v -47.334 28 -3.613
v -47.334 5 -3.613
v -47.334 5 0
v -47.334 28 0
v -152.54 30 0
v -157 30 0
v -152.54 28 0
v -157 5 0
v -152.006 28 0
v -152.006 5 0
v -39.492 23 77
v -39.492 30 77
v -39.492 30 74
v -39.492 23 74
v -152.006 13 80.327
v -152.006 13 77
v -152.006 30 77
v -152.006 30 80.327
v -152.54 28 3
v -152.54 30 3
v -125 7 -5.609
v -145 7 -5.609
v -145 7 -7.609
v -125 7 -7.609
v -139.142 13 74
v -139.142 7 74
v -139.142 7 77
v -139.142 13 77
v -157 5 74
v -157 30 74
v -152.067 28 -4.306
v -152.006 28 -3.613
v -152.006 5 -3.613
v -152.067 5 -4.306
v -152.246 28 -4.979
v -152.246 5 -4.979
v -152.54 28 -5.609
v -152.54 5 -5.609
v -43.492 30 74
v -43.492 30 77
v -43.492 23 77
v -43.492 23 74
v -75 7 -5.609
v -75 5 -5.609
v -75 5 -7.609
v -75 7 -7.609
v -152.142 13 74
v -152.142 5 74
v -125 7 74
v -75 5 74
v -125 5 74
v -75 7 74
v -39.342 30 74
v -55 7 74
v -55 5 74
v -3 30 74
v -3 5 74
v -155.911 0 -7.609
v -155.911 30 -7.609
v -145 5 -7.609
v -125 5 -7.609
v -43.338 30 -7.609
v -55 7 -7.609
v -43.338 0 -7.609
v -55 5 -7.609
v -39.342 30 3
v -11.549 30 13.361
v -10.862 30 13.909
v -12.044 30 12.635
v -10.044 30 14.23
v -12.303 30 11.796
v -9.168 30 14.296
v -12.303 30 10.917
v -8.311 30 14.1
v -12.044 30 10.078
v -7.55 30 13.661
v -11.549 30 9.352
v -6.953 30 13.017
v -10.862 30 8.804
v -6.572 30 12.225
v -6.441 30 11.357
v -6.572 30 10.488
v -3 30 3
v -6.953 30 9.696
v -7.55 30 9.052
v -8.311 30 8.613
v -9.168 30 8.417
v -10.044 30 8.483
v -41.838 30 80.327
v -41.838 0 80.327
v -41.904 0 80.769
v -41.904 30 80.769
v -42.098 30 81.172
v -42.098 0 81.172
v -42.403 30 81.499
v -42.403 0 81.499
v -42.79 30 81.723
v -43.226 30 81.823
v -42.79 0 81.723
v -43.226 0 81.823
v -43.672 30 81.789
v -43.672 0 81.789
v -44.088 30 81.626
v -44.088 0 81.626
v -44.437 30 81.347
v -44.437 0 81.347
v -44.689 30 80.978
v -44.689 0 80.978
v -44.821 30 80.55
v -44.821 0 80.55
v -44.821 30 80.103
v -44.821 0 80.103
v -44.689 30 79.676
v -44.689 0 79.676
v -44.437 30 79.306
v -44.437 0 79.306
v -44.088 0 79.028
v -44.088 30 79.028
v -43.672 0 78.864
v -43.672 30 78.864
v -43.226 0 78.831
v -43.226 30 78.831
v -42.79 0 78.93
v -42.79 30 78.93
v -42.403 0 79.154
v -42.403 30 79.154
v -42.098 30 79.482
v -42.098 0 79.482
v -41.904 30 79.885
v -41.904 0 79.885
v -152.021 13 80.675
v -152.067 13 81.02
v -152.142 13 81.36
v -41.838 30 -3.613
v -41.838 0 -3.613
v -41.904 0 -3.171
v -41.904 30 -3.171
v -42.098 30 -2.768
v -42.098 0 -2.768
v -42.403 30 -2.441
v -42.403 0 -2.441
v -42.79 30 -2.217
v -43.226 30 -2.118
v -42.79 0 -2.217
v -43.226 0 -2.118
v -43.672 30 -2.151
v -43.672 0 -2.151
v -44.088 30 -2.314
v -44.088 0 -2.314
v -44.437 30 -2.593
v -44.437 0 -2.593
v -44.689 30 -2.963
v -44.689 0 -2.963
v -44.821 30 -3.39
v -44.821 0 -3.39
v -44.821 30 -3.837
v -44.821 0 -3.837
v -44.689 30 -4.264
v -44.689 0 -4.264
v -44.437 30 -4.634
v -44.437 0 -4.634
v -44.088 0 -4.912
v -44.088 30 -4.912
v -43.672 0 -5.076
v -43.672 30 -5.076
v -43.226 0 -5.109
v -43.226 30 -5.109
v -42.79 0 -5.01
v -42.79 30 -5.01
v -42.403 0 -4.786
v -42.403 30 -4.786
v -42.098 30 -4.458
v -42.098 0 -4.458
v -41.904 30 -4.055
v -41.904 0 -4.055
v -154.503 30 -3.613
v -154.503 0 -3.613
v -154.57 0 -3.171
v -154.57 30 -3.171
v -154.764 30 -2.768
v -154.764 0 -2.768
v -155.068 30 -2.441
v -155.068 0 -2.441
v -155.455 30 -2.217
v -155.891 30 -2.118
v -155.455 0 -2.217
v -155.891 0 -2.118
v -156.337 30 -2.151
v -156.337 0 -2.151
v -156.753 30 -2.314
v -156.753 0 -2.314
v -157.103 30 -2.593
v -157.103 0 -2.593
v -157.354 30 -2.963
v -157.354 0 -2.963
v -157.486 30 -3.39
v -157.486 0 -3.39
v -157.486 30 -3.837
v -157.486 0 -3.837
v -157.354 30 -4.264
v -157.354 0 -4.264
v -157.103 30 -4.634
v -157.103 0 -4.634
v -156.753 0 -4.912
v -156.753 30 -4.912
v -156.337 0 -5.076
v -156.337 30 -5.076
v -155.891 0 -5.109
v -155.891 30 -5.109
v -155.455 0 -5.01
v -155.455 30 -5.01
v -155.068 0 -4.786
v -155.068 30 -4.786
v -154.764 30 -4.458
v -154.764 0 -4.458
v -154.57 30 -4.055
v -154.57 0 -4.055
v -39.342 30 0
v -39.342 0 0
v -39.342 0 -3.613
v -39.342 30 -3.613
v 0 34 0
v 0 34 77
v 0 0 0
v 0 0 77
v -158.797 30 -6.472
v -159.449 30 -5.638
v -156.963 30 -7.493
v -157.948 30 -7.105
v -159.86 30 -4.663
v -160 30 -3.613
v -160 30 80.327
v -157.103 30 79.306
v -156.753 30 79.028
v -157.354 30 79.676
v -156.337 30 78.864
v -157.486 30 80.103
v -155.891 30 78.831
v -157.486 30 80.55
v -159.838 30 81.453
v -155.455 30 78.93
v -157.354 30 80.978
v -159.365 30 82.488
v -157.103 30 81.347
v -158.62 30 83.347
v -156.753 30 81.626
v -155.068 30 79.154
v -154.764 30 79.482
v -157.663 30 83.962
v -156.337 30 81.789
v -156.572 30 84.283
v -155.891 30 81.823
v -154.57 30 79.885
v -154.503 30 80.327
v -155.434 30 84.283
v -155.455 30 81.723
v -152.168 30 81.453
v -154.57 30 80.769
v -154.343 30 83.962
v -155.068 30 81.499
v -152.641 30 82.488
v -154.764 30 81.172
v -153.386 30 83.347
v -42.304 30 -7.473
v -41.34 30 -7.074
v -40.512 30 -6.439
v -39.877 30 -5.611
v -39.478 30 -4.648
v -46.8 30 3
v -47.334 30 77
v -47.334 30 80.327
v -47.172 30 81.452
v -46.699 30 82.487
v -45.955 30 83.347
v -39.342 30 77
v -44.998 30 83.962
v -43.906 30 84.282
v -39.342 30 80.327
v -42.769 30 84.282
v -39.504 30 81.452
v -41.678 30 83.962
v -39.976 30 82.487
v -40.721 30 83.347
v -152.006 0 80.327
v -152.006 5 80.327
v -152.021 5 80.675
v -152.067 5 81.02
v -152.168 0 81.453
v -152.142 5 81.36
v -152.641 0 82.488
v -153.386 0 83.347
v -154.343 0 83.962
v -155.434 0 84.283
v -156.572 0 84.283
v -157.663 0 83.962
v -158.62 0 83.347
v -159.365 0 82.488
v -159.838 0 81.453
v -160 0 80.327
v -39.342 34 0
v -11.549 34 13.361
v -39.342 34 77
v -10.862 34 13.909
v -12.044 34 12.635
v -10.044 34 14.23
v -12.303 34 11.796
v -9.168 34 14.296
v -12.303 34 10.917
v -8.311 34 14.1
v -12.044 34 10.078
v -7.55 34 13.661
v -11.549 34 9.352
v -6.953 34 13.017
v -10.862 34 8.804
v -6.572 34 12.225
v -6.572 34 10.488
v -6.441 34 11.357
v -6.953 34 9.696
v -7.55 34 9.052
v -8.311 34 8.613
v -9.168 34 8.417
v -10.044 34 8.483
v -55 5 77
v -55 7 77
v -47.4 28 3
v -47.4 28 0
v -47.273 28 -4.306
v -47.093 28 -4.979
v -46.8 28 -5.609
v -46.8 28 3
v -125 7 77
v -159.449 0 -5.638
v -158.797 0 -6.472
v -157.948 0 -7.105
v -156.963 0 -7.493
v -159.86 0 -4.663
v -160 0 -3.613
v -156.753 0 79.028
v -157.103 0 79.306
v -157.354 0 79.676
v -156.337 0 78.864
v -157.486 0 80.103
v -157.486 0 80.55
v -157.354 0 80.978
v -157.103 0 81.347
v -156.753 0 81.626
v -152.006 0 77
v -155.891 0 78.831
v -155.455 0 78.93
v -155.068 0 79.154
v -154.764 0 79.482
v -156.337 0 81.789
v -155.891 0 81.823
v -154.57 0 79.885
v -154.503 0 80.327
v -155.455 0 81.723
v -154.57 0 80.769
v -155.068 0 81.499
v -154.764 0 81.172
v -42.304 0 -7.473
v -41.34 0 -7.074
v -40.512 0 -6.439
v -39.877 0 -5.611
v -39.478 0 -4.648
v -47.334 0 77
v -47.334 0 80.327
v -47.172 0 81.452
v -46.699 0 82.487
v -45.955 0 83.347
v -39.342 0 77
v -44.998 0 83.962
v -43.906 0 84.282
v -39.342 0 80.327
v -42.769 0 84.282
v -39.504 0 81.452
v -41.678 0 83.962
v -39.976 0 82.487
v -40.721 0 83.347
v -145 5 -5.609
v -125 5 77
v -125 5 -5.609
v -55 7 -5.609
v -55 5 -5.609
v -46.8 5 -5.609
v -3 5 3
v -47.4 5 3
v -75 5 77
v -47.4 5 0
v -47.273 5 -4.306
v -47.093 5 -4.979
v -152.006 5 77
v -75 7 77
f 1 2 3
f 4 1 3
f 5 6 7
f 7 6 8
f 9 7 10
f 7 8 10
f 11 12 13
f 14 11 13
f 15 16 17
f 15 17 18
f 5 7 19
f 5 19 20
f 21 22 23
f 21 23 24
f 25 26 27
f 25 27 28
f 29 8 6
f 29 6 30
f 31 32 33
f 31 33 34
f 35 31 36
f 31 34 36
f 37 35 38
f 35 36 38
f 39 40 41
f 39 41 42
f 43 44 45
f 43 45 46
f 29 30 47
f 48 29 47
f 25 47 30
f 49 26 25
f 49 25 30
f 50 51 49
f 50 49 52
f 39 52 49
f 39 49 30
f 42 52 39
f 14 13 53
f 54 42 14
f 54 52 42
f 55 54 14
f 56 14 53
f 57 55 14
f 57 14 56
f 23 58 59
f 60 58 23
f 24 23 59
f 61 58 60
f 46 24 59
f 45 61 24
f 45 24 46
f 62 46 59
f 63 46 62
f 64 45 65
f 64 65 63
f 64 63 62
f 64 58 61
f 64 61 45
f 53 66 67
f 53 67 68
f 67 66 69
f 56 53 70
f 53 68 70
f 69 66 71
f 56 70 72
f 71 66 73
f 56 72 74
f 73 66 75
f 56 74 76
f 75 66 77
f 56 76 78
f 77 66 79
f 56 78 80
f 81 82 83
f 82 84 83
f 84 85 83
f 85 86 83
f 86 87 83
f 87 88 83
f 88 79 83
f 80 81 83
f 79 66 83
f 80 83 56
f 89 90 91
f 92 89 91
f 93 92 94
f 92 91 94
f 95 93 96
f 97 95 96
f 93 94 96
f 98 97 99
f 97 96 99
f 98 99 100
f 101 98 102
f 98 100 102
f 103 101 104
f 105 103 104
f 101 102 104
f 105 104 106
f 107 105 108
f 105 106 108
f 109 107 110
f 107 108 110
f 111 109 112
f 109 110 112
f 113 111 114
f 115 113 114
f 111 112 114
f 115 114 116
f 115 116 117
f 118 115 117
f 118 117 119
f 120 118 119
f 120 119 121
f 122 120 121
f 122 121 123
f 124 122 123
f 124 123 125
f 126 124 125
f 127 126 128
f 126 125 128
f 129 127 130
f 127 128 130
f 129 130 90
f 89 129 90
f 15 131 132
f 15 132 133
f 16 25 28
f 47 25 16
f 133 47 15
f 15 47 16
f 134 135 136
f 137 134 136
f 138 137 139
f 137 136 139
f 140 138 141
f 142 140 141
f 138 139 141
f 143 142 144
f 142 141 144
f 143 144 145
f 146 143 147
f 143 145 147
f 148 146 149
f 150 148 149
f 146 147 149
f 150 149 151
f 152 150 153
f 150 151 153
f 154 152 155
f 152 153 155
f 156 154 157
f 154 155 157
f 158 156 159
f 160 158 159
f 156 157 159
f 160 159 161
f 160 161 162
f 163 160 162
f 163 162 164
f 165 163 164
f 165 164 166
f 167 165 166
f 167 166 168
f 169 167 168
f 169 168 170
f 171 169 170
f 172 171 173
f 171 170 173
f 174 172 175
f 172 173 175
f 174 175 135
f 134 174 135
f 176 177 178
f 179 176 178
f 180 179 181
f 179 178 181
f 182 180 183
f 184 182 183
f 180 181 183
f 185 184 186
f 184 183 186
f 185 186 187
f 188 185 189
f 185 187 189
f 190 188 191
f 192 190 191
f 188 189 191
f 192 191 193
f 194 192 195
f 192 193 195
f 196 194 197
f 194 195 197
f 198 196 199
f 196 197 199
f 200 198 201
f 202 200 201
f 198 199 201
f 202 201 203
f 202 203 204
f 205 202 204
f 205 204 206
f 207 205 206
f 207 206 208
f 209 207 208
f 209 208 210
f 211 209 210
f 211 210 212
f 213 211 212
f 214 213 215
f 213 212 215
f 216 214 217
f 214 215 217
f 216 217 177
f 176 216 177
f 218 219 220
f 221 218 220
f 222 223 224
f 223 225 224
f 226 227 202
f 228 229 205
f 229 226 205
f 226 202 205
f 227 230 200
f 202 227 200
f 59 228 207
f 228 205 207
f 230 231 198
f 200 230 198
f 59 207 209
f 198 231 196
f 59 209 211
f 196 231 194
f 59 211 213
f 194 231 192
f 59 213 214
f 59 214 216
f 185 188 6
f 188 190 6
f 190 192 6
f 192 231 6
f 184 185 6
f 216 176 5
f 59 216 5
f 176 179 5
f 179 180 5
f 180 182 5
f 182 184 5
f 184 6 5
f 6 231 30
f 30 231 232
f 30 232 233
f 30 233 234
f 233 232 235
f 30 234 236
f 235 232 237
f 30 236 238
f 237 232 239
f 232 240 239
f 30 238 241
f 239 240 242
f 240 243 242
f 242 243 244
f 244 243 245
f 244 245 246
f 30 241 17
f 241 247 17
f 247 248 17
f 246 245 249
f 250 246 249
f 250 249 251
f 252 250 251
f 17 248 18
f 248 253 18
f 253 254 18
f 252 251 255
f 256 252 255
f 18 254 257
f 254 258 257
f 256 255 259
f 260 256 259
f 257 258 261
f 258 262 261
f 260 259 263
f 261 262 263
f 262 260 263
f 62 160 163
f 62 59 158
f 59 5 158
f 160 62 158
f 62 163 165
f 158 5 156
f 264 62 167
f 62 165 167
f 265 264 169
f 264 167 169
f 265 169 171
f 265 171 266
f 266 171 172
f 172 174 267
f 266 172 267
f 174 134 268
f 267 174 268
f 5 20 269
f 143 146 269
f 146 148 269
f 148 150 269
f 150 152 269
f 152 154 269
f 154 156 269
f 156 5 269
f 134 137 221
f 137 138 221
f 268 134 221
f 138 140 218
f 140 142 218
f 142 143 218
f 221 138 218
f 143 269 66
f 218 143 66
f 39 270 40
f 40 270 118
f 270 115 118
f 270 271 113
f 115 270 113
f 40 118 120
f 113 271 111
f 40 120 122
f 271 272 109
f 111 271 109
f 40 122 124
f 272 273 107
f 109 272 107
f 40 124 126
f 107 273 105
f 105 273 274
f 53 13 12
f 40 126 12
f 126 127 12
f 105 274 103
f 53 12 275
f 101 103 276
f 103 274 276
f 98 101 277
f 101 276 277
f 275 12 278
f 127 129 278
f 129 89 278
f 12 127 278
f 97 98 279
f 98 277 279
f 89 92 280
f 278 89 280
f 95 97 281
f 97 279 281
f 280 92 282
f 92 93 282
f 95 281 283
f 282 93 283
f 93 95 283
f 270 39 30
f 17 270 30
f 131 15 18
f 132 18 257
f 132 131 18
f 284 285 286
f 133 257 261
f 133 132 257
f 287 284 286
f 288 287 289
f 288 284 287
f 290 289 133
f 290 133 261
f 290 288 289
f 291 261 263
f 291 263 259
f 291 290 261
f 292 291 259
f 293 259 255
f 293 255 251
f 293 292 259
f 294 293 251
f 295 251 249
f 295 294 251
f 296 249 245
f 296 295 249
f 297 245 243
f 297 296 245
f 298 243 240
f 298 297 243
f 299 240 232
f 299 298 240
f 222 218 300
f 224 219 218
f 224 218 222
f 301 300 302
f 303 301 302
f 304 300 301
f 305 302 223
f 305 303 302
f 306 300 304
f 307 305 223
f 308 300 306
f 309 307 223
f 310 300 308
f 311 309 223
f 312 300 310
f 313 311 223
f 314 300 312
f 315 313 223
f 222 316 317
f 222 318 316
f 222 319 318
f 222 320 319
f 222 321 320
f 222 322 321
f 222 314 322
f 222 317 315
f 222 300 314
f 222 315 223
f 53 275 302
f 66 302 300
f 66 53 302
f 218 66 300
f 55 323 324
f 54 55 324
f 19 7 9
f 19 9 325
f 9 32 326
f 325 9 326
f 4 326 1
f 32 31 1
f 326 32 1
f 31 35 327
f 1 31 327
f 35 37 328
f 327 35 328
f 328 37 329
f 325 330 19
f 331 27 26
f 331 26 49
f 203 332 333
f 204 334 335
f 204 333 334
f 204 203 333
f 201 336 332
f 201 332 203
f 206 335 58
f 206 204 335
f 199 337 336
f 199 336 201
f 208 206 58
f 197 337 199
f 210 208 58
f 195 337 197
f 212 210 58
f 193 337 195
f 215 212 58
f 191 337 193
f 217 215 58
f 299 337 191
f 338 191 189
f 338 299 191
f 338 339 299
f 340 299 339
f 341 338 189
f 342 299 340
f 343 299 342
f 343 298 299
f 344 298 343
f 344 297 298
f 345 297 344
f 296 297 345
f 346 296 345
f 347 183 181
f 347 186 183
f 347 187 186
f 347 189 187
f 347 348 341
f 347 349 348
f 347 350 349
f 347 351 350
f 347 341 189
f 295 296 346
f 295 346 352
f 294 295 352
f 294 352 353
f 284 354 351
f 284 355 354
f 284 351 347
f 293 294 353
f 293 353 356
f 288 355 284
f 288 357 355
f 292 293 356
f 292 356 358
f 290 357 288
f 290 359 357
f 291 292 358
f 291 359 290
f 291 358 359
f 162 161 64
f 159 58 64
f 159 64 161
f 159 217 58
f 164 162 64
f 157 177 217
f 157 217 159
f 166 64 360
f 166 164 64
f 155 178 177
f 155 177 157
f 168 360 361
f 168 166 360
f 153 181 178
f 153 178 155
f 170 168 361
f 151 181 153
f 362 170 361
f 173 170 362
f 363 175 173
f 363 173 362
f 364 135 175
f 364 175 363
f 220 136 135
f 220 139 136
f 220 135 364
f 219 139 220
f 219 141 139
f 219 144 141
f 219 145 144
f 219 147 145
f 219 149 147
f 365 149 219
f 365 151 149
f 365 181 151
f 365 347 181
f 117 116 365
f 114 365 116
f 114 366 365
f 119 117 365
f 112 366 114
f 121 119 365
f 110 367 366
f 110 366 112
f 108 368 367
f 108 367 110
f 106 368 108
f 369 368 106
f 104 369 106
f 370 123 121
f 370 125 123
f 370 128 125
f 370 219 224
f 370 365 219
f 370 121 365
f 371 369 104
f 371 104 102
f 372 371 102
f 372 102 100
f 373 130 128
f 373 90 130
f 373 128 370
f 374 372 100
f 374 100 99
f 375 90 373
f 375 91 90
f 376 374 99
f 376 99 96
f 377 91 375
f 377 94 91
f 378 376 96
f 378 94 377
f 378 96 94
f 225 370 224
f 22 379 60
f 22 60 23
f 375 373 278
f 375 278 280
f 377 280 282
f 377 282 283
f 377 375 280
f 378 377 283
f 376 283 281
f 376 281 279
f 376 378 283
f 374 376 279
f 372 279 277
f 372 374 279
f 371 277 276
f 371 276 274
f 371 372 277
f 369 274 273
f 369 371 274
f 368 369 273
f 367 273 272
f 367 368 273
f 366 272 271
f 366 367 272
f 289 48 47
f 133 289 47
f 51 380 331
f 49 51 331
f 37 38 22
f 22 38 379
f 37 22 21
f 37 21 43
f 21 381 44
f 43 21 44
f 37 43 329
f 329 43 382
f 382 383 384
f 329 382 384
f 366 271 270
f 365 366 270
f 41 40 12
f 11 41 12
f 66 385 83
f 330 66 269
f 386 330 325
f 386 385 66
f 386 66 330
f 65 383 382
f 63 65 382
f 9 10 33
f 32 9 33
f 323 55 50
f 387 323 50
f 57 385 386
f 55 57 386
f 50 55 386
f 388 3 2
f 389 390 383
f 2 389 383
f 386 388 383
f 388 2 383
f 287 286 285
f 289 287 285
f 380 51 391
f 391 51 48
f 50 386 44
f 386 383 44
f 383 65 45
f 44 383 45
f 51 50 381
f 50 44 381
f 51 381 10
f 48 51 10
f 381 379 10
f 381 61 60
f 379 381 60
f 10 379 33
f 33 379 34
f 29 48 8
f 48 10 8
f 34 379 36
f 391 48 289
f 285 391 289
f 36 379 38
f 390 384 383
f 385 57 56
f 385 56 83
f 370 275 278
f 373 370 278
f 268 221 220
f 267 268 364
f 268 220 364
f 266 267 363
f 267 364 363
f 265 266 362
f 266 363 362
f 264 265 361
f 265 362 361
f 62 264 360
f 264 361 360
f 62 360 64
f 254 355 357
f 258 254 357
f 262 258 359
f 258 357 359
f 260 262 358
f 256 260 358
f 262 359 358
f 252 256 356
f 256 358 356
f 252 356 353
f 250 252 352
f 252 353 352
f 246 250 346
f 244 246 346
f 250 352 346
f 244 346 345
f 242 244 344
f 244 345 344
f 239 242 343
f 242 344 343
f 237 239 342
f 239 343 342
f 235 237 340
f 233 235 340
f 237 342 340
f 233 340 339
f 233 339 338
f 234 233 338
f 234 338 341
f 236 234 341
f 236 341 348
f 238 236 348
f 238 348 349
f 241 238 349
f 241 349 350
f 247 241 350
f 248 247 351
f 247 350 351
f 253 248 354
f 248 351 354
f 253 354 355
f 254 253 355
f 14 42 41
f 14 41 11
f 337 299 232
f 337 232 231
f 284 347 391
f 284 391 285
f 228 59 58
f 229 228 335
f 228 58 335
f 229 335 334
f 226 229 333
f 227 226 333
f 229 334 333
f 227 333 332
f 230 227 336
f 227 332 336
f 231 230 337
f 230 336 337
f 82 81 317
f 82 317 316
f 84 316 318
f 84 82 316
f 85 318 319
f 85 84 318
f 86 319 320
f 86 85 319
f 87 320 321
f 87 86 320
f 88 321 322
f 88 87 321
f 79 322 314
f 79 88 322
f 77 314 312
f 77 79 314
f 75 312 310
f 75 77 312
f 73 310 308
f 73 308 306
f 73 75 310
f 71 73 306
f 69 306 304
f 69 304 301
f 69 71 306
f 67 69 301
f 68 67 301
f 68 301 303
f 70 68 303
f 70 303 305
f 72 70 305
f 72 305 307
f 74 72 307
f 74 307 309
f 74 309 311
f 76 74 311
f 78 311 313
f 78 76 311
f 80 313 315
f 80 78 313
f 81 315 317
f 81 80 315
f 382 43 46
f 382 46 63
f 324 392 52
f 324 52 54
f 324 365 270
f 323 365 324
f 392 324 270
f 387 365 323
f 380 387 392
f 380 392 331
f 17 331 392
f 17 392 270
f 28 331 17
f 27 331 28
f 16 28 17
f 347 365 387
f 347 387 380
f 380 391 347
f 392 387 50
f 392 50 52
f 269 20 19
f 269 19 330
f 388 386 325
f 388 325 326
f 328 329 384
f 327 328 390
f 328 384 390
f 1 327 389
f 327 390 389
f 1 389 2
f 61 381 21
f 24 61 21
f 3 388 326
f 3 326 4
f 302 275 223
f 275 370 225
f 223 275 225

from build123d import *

# Parameters (mm, degrees)
SKETCH1_W           = 160
SKETCH1_H           = 77
BOSS_EXTRUDE1_DEPTH = 5
BOSS_EXTRUDE2_DEPTH = 25
SKETCH3_R           = 1.499999813
SKETCH3_R_2         = 1.5
BOSS_EXTRUDE3_DEPTH = 30
SKETCH5_W           = 39.3418497
SKETCH5_H           = 77
SKETCH5_R           = 2.947381685
BOSS_EXTRUDE5_DEPTH = 4
BOSS_EXTRUDE6_DEPTH = 5
SKETCH9_W           = 112.573012358
SKETCH9_H           = 2
BOSS_EXTRUDE7_DEPTH = 25
CUT_EXTRUDE2_START  = -74
SKETCH7_W           = 13
SKETCH7_H           = 8
CUT_EXTRUDE2_DEPTH  = 119
SKETCH6_W           = 20
SKETCH6_H           = 2
CUT_EXTRUDE1_DEPTH  = 179
SKETCH10_W          = 4
SKETCH10_H          = 3
CUT_EXTRUDE3_DEPTH  = 7
SKETCH11_W          = 105.740519207
SKETCH11_H          = 2
BOSS_EXTRUDE8_DEPTH = 8.609255


with BuildPart() as part:
    # Sketch1 → Boss-Extrude1 (new body)
    with BuildSketch(Plane(origin=(0, 0, 0), x_dir=(1, 0, 0), z_dir=(0, 1, 0))):
        with Locations((-80, -38.5)):
            Rectangle(SKETCH1_W, SKETCH1_H)
    extrude(amount=BOSS_EXTRUDE1_DEPTH)

    # Sketch2 → Boss-Extrude2 (add)
    with BuildSketch(Plane(origin=(0, 5, 0), x_dir=(1, 0, 0), z_dir=(0, 1, 0))):
        Polygon((-160, 0), (-157, 0), (-157, -74), (-3, -74), (-3, -3), (-47.4, -3), (-47.4, 0), (0, 0), (0, -77), (-160, -77), align=None)
    extrude(amount=BOSS_EXTRUDE2_DEPTH)

    # Sketch3 → Boss-Extrude3 (add)
    with BuildSketch(Plane.XZ):
        with BuildLine():
            Line((-160, 77), (-152.006026471, 77))
            Line((-152.006026471, 77), (-152.006026471, 80.326705))
            ThreePointArc((-152.006026471, 80.326705), (-156.003013236, 84.323691764), (-160, 80.326705))
            Line((-160, 80.326705), (-160, 77))
        make_face()
        with Locations((-156.003013236, 80.326705)):
            Circle(SKETCH3_R, mode=Mode.SUBTRACT)
        with BuildLine():
            Line((-47.333694812, 80.326705), (-47.333694812, 77))
            Line((-47.333694812, 77), (-39.3418497, 77))
            Line((-39.3418497, 77), (-39.3418497, 80.326705))
            ThreePointArc((-39.3418497, 80.326705), (-43.337772256, 84.322627556), (-47.333694812, 80.326705))
        make_face()
        with Locations((-43.337772256, 80.326705)):
            Circle(SKETCH3_R_2, mode=Mode.SUBTRACT)
        with BuildLine():
            Line((-160, 0), (-152.006026471, 0))
            Line((-152.006026471, 0), (-152.006026471, -3.613332))
            ThreePointArc((-152.006026471, -3.613332), (-156.003013236, -7.610318764), (-160, -3.613332))
            Line((-160, -3.613332), (-160, 0))
        make_face()
        with Locations((-156.003013236, -3.613332)):
            Circle(SKETCH3_R_2, mode=Mode.SUBTRACT)
        with BuildLine():
            Line((-47.333694812, -3.613332), (-47.333694812, 0))
            Line((-47.333694812, 0), (-39.3418497, 0))
            Line((-39.3418497, 0), (-39.3418497, -3.613332))
            ThreePointArc((-39.3418497, -3.613332), (-43.337772256, -7.609254556), (-47.333694812, -3.613332))
        make_face()
        with Locations((-43.337772256, -3.613332)):
            Circle(SKETCH3_R_2, mode=Mode.SUBTRACT)
    extrude(amount=-BOSS_EXTRUDE3_DEPTH)

    # Sketch5 → Boss-Extrude5 (add)
    with BuildSketch(Plane(origin=(0, 30, 0), x_dir=(1, 0, 0), z_dir=(0, 1, 0))):
        with Locations((-19.67092485, -38.5)):
            Rectangle(SKETCH5_W, SKETCH5_H)
        with Locations((-9.3881, -11.3566)):
            Circle(SKETCH5_R, mode=Mode.SUBTRACT)
    extrude(amount=BOSS_EXTRUDE5_DEPTH)

    # Sketch8 → Boss-Extrude6 (add)
    with BuildSketch(Plane.XZ):
        with BuildLine():
            ThreePointArc((-152.006026471, -3.613332), (-153.144295011, -6.4068304), (-155.910784614, -7.609254556))
            Line((-155.910784614, -7.609254556), (-43.337772256, -7.609254556))
            ThreePointArc((-43.337772256, -7.609254556), (-46.163316193, -6.438875937), (-47.333694812, -3.613332))
            Line((-47.333694812, -3.613332), (-47.333694812, 0))
            Line((-47.333694812, 0), (-152.006026471, 0))
            Line((-152.006026471, 0), (-152.006026471, -3.613332))
        make_face()
    extrude(amount=-BOSS_EXTRUDE6_DEPTH)

    # Sketch9 → Boss-Extrude7 (add)
    with BuildSketch(Plane(origin=(0, 5, 0), x_dir=(1, 0, 0), z_dir=(0, 1, 0))):
        with Locations((-99.624278435, 6.609254556)):
            Rectangle(SKETCH9_W, SKETCH9_H)
    extrude(amount=BOSS_EXTRUDE7_DEPTH)

    # Sketch7 → Cut-Extrude2 (cut)
    with BuildSketch(Plane(origin=(0, 0, 0), x_dir=(-1, 0, 0), z_dir=(0, 0, -1)).offset(CUT_EXTRUDE2_START)):
        with Locations((145.6418497, 9)):
            Rectangle(SKETCH7_W, SKETCH7_H)
    extrude(amount=-CUT_EXTRUDE2_DEPTH, mode=Mode.SUBTRACT)

    # Sketch6 → Cut-Extrude1 (cut)
    with BuildSketch(Plane.XY.offset(77)):
        with Locations((-135, 6)):
            Rectangle(SKETCH6_W, SKETCH6_H)
        with Locations((-65, 6)):
            Rectangle(SKETCH6_W, SKETCH6_H)
    extrude(amount=-CUT_EXTRUDE1_DEPTH, mode=Mode.SUBTRACT)

    # Sketch10 → Cut-Extrude3 (cut)
    with BuildSketch(Plane(origin=(0, 30, 0), x_dir=(1, 0, 0), z_dir=(0, 1, 0))):
        with Locations((-41.4918497, -75.5)):
            Rectangle(SKETCH10_W, SKETCH10_H)
    extrude(amount=-CUT_EXTRUDE3_DEPTH, mode=Mode.SUBTRACT)

    # Sketch11 → Boss-Extrude8 (add)
    with BuildSketch(Plane.XY.offset(-5.609254556)):
        with Locations((-99.669778561, 29)):
            Rectangle(SKETCH11_W, SKETCH11_H)
    extrude(amount=BOSS_EXTRUDE8_DEPTH)


solid = part.part
